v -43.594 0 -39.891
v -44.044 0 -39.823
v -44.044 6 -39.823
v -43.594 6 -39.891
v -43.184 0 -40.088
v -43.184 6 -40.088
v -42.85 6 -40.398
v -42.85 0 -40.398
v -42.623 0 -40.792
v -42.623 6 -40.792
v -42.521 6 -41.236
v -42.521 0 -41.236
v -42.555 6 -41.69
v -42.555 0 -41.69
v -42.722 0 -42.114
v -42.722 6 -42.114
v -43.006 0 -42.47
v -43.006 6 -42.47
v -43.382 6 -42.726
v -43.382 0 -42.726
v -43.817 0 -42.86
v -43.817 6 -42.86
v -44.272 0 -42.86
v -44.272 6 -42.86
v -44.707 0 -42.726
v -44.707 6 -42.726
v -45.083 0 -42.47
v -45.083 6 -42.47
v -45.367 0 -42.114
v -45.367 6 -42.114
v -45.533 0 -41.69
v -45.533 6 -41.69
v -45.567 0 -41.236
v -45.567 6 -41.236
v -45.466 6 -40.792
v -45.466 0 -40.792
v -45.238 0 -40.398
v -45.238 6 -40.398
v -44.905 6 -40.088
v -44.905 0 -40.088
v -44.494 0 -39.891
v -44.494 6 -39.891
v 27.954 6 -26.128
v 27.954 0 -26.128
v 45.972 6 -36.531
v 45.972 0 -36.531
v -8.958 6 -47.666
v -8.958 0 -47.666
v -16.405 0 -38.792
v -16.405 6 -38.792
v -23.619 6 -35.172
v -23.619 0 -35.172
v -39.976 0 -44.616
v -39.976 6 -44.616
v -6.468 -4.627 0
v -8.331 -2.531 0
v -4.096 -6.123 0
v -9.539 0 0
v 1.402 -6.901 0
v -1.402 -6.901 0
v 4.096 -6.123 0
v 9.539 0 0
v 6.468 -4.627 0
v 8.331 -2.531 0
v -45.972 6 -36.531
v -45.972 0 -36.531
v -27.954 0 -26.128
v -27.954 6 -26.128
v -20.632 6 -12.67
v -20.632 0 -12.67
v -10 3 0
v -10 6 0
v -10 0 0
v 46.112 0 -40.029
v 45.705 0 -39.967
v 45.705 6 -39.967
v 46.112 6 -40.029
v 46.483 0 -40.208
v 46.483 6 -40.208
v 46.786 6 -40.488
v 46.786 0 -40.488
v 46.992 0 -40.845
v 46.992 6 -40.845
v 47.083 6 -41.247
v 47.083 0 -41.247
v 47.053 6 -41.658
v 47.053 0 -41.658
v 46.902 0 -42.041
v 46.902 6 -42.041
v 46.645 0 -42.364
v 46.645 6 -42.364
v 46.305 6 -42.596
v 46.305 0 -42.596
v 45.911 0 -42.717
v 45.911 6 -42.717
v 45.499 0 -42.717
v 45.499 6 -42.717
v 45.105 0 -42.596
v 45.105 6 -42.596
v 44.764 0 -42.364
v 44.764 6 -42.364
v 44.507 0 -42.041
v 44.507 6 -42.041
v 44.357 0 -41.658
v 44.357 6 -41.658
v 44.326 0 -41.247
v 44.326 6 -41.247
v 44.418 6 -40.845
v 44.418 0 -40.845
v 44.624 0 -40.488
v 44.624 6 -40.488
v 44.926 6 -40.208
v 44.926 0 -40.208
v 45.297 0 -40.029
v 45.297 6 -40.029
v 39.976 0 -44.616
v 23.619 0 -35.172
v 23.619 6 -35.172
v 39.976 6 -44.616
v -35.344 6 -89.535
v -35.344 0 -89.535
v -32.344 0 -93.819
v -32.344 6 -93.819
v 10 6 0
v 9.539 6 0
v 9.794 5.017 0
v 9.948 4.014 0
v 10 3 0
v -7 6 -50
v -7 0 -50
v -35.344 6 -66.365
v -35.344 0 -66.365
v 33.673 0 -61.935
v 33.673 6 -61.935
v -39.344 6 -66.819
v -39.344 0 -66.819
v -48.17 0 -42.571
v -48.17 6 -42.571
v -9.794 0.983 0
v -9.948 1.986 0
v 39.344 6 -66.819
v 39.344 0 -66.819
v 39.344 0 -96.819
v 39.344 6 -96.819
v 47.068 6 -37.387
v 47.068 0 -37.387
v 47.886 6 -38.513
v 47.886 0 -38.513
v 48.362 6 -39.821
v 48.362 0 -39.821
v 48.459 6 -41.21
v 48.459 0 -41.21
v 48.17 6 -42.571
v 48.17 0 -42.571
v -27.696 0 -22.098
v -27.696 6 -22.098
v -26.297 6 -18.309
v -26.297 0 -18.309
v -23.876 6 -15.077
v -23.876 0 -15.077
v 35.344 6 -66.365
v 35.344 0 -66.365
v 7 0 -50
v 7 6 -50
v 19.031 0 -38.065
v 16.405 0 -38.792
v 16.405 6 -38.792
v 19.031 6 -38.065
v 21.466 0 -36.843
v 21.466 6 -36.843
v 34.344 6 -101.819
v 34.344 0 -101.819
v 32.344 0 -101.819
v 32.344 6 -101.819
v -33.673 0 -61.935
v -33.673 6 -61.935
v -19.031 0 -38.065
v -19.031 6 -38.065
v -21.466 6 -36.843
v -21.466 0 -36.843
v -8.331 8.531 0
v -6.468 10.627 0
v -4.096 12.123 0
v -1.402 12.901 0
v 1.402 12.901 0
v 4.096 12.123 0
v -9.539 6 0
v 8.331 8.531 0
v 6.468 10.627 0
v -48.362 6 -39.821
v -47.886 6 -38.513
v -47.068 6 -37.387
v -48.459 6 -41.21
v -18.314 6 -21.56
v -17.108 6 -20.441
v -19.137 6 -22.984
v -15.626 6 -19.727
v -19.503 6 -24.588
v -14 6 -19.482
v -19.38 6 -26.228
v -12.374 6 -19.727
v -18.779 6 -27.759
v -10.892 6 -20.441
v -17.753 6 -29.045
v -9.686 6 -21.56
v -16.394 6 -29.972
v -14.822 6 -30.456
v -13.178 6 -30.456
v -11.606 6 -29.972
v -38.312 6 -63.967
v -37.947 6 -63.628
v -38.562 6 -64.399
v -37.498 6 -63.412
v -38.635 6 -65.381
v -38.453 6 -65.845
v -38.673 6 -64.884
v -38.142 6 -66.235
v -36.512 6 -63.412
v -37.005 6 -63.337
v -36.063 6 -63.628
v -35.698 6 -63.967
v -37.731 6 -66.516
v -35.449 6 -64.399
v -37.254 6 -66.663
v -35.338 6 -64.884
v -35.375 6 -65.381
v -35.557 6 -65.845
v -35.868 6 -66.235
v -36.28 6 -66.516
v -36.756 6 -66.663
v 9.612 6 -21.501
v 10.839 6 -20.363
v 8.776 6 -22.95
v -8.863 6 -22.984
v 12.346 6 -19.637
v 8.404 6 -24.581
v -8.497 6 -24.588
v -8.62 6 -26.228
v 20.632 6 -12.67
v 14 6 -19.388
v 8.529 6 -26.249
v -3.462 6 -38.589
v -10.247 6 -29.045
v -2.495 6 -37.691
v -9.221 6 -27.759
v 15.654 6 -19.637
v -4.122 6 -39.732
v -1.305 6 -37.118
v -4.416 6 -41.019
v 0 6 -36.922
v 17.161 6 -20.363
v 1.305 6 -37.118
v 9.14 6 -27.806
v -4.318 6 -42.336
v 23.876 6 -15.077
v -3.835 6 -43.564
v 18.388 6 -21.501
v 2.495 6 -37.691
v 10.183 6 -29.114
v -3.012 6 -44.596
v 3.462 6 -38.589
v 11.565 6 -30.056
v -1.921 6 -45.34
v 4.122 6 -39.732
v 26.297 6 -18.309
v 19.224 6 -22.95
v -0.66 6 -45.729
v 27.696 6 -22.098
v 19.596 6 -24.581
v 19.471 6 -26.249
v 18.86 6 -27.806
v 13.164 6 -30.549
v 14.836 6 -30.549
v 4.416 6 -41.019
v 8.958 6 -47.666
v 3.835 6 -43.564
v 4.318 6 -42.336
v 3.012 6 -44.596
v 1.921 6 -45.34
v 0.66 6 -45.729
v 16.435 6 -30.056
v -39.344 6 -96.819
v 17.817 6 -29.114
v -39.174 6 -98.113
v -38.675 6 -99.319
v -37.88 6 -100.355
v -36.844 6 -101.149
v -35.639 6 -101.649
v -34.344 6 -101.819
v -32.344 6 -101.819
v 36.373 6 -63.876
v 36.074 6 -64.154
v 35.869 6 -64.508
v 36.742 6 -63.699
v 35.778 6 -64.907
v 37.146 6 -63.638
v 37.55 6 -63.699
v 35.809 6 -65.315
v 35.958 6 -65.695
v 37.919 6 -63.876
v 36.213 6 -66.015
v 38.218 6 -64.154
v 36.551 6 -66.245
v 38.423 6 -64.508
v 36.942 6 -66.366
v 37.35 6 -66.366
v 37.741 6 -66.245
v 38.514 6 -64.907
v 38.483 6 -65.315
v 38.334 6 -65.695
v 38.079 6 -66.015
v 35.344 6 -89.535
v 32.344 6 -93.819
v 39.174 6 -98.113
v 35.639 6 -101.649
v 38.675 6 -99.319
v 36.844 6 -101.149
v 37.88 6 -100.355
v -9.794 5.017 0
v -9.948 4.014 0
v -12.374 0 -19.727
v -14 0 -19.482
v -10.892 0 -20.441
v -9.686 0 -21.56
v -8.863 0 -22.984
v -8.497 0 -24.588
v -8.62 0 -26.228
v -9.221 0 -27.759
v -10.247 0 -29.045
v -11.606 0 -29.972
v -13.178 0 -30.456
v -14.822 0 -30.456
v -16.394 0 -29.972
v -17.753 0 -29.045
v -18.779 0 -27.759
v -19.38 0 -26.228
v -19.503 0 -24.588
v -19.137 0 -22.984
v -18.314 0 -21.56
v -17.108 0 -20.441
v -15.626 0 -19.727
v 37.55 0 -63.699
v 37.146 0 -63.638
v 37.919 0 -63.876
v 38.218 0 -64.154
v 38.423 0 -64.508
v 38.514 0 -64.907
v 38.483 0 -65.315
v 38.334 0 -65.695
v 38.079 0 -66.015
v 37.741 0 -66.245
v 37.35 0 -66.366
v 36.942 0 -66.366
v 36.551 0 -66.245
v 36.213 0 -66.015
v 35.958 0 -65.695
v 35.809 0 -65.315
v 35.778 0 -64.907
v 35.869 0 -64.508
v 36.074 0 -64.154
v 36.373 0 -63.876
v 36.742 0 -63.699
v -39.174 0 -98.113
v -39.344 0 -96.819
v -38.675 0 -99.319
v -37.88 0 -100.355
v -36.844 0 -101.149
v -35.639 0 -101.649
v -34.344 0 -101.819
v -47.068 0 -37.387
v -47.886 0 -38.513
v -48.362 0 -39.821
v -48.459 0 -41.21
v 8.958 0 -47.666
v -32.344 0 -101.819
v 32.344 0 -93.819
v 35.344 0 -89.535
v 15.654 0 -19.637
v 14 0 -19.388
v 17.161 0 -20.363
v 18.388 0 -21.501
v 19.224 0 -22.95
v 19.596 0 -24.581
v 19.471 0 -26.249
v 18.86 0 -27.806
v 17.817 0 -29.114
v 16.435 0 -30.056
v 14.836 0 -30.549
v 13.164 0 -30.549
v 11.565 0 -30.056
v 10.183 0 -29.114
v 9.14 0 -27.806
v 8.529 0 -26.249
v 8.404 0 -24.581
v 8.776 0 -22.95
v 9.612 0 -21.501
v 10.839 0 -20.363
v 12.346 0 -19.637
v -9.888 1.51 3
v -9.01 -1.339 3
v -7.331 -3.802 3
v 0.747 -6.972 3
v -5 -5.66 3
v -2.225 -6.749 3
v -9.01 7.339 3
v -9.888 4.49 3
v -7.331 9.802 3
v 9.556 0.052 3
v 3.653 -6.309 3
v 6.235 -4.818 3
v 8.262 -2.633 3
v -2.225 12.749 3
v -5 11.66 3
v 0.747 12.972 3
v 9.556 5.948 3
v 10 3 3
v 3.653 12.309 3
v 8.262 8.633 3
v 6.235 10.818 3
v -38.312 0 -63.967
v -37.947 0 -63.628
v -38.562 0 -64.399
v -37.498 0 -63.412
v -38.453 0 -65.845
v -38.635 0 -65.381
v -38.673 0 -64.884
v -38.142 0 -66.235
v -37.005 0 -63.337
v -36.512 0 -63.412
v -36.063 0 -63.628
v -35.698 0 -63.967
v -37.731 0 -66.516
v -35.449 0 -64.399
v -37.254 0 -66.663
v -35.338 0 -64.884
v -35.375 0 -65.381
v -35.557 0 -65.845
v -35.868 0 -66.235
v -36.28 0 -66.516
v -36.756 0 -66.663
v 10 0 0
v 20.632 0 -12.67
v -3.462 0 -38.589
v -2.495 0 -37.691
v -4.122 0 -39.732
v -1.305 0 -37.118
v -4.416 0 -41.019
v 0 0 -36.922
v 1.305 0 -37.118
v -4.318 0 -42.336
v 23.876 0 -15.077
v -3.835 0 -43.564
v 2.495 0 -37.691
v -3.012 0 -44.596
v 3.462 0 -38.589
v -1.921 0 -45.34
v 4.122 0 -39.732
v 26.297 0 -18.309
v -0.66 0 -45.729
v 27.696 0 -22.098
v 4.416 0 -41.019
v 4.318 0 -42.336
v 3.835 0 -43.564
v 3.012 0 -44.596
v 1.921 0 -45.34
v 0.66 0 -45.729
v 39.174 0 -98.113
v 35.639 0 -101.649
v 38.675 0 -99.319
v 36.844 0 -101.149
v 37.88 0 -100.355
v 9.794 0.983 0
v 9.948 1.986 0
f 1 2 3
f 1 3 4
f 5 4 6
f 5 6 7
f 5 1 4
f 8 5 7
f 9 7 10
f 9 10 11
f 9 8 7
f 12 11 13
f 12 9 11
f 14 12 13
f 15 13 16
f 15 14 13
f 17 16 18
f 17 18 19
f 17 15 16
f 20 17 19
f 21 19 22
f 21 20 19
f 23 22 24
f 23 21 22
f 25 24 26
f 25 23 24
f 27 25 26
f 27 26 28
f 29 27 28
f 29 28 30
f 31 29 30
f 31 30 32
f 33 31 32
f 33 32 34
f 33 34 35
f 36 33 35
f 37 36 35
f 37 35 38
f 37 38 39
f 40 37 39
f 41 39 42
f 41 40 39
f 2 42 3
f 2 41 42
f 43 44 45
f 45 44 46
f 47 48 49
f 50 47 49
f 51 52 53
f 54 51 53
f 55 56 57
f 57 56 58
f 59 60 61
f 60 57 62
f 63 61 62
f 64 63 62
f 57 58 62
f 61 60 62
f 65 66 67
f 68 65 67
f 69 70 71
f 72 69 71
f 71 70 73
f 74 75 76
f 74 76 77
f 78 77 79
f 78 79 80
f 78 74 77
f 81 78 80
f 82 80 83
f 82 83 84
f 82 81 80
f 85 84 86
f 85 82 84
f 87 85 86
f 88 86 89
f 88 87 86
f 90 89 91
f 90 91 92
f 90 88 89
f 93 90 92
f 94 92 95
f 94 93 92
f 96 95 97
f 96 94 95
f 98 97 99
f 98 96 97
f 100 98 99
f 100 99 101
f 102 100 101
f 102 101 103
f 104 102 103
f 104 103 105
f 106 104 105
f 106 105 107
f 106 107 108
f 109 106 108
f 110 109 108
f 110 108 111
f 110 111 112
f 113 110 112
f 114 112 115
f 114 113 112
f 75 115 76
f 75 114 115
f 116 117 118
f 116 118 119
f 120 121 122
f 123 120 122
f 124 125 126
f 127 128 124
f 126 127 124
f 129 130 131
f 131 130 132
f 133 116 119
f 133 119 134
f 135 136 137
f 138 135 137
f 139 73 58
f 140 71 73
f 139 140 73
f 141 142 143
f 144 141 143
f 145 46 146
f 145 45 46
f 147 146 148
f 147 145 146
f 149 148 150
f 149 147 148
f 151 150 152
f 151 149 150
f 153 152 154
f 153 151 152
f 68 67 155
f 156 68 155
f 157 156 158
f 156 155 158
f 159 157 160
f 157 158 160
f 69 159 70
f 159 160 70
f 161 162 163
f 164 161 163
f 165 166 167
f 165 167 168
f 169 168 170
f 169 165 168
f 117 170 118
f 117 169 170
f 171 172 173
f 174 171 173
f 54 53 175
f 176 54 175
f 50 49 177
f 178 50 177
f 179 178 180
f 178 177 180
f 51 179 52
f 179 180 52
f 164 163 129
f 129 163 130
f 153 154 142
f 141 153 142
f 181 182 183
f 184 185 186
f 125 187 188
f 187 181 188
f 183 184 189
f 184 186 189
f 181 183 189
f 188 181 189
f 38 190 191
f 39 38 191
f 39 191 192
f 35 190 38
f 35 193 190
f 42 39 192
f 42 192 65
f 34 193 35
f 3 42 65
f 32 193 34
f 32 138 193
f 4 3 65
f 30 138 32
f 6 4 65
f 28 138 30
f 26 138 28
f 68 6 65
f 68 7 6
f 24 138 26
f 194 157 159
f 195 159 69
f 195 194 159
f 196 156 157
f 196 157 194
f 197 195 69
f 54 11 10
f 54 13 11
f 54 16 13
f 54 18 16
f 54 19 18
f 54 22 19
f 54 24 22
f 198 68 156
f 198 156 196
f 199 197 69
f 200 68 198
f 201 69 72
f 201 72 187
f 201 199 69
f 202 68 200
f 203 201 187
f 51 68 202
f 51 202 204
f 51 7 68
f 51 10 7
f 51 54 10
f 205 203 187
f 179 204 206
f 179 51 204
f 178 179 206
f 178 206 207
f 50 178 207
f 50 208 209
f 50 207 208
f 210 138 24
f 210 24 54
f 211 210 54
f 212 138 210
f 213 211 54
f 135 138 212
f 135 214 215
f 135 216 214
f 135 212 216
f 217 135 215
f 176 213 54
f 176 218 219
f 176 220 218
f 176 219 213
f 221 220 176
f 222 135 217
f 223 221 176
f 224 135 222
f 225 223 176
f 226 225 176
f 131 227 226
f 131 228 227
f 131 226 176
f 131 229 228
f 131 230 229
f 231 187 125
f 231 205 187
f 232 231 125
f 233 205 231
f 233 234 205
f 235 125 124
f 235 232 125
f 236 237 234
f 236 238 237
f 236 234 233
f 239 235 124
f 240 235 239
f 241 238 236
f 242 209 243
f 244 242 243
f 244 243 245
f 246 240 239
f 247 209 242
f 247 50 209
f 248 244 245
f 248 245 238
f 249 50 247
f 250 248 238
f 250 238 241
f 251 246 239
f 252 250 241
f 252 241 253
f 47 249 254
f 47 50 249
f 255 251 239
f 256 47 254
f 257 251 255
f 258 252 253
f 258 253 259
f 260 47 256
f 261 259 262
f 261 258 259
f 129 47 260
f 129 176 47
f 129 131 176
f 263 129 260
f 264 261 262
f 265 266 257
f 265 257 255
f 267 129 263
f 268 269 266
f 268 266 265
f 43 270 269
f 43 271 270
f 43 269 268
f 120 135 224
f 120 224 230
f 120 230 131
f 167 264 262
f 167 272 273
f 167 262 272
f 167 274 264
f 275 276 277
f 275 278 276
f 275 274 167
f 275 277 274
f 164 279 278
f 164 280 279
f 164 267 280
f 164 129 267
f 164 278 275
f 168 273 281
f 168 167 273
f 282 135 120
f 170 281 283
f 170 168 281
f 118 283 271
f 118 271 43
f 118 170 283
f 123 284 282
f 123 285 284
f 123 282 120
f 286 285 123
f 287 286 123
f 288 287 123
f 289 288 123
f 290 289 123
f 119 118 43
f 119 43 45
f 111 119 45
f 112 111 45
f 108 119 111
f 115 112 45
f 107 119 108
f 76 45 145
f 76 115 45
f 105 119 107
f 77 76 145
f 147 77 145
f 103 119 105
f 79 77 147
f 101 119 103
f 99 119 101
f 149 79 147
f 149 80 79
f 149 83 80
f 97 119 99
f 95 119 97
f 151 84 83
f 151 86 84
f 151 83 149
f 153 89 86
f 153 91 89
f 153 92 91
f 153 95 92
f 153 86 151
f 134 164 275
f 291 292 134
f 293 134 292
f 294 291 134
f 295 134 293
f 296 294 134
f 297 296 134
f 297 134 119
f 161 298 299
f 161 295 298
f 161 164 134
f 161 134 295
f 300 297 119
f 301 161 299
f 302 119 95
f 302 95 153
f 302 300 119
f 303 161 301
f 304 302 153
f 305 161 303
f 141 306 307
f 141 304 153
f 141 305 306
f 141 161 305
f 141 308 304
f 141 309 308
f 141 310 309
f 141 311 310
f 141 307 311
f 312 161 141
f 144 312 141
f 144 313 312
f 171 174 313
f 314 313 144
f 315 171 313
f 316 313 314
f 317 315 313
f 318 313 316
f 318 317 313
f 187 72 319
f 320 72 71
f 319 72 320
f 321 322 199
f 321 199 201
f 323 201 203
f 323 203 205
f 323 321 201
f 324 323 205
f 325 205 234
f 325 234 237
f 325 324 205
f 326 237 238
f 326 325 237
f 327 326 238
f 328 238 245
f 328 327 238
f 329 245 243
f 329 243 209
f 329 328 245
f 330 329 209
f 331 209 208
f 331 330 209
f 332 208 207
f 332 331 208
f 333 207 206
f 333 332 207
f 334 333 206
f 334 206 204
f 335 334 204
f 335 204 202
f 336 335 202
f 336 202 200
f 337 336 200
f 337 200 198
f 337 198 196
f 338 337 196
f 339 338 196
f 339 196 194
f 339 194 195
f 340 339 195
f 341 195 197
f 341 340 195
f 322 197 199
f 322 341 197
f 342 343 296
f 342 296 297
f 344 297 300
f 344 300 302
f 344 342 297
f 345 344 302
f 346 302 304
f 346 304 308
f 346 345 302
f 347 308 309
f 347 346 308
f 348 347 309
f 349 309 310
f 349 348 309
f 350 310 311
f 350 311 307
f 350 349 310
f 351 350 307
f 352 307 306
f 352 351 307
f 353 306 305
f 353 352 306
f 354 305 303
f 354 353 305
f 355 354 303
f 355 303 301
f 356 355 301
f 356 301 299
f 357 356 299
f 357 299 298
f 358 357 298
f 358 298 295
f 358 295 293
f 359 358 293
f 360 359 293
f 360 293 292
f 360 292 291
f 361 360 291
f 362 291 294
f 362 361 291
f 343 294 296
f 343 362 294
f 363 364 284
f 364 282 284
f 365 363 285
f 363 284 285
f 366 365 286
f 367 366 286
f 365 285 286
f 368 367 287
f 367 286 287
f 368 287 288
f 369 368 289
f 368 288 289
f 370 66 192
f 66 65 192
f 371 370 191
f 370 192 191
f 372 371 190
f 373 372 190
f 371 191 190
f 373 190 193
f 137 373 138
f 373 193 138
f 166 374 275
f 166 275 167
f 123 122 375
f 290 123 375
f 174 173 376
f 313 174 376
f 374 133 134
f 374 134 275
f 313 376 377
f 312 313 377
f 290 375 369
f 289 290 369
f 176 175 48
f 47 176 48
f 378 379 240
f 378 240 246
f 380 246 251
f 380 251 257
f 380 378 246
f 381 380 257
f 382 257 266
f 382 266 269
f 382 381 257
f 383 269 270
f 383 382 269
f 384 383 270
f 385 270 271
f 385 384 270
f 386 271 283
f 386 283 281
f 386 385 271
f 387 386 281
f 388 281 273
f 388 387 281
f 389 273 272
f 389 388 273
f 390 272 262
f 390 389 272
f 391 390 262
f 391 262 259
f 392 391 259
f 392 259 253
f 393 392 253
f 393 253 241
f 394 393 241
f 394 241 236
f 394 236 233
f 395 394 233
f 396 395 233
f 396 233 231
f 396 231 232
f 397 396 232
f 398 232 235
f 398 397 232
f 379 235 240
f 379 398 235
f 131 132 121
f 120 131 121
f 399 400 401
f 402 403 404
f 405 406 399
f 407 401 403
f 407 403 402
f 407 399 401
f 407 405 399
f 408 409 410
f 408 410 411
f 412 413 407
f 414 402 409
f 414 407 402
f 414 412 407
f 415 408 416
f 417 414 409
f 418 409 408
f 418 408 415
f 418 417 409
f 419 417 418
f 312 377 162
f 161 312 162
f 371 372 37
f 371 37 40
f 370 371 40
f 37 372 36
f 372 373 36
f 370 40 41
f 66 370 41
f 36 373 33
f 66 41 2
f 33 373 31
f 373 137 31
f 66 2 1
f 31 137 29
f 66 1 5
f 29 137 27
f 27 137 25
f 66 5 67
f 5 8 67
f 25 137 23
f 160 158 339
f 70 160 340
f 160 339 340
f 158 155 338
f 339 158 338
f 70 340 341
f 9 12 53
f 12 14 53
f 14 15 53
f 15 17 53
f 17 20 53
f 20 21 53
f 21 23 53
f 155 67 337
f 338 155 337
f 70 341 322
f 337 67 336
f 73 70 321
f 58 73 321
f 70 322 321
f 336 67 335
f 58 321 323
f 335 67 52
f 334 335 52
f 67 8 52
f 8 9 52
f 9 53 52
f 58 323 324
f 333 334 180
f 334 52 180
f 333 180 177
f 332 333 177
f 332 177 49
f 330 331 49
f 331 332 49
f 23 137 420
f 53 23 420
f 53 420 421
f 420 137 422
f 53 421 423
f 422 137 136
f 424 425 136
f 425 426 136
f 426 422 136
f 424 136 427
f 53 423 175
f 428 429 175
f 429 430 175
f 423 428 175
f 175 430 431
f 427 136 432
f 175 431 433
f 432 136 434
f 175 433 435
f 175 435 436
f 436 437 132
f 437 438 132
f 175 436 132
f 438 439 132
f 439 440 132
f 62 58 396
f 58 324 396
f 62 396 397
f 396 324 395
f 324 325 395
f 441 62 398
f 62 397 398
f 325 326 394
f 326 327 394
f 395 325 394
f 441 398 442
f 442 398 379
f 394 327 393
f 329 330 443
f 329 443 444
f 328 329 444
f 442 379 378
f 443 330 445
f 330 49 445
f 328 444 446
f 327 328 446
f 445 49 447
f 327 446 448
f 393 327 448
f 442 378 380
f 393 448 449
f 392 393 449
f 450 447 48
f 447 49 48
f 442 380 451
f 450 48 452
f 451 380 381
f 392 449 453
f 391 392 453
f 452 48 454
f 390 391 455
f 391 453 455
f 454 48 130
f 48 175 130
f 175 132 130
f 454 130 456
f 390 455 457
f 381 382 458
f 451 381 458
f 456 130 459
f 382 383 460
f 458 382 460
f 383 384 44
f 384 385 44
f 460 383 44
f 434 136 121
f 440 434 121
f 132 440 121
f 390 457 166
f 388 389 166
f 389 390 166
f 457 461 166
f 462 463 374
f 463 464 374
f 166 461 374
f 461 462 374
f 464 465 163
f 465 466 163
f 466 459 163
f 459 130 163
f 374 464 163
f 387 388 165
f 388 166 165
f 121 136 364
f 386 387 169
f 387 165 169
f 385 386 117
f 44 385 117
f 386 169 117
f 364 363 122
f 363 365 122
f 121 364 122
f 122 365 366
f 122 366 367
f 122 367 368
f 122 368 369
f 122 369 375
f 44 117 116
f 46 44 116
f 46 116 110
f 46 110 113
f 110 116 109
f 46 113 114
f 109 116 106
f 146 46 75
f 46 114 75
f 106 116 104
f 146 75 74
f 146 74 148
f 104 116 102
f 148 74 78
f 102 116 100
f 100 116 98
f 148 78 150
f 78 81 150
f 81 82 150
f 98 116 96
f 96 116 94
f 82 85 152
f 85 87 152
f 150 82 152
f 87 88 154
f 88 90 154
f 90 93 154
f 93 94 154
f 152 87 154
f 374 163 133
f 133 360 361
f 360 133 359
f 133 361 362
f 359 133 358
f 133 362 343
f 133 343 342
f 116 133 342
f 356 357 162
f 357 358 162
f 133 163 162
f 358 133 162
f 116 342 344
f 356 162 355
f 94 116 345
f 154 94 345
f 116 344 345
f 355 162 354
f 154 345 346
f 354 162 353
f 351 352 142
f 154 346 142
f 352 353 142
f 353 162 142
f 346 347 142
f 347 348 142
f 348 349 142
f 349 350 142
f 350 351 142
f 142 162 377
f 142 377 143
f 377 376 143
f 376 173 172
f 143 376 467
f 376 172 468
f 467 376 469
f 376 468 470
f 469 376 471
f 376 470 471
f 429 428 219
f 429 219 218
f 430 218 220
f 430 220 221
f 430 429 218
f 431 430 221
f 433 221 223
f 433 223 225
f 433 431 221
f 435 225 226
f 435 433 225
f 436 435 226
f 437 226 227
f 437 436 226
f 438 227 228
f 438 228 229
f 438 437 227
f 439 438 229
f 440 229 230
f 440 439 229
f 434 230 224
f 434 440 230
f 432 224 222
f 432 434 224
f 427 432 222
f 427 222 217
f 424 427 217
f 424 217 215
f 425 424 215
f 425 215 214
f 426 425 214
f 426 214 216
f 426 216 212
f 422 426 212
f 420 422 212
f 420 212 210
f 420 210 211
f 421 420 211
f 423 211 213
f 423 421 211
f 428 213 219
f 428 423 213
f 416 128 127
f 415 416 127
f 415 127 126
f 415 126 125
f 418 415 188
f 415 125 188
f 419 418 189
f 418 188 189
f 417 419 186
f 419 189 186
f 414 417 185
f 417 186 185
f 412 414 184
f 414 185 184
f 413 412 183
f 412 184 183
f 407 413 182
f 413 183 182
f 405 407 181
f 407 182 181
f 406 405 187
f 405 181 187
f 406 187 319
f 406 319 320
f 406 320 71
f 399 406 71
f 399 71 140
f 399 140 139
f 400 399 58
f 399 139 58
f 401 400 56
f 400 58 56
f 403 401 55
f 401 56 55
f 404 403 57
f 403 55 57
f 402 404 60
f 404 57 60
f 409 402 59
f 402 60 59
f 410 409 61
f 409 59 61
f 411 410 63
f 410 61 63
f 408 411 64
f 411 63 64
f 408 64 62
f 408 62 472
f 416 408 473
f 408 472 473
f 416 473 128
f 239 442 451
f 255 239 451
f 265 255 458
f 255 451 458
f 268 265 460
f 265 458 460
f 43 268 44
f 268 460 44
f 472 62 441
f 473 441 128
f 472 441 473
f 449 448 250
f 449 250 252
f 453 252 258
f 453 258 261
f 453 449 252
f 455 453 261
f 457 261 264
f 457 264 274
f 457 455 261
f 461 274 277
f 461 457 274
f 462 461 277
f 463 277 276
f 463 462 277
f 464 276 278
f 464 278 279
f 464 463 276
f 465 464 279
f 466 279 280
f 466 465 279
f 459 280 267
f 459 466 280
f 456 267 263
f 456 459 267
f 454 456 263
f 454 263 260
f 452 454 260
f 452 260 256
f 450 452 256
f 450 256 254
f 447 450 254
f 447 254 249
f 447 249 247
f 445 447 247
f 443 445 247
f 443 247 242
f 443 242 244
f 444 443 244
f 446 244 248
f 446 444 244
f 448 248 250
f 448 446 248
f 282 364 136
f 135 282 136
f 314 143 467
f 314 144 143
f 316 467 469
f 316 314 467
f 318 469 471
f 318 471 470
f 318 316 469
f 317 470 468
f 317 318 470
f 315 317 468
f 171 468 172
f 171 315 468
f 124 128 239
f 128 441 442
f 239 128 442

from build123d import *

# Parameters (mm, degrees)
SKETCH_1_R      = 5.517972707
SKETCH_1_R_2    = 5.611863705
SKETCH_1_R_3    = 1.527148593
SKETCH_1_R_4    = 1.382615372
SKETCH_1_R_5    = 1.672120879
SKETCH_1_R_6    = 1.371563178
SKETCH_1_R_7    = 4.42854447
EXTRUDE_1_DEPTH = 6
SKETCH_2_R      = 10
EXTRUDE_2_DEPTH = 3
FILLET_1_R      = 5


with BuildPart() as part:
    # 草图1 → 凸台-拉伸1 (new body)
    with BuildSketch(Plane(origin=(0, 0, 0), x_dir=(1, 0, 0), z_dir=(0, 1, 0))):
        with BuildLine():
            Line((-10, 0), (10, 0))
            Line((10, 0), (20.63165677, 12.67031515))
            ThreePointArc((20.63165677, 12.67031515), (26.297438403, 18.308736388), (27.95445115, 26.128402898))
            Line((27.95445115, 26.128402898), (49.605086245, 38.628402898))
            Line((49.605086245, 38.628402898), (39.344481945, 66.819181521))
            Line((39.344481945, 66.819181521), (39.344481945, 101.819181521))
            Line((39.344481945, 101.819181521), (32.344481945, 101.819181521))
            Line((32.344481945, 101.819181521), (32.344481945, 93.819181521))
            Line((32.344481945, 93.819181521), (35.344481945, 89.534737501))
            Line((35.344481945, 89.534737501), (35.344481945, 66.364694281))
            Line((35.344481945, 66.364694281), (7, 50))
            Line((7, 50), (-7, 50))
            Line((-7, 50), (-35.344481945, 66.364694281))
            Line((-35.344481945, 66.364694281), (-35.344481945, 89.534737501))
            Line((-35.344481945, 89.534737501), (-32.344481945, 93.819181521))
            Line((-32.344481945, 93.819181521), (-32.344481945, 101.819181521))
            Line((-32.344481945, 101.819181521), (-39.344481945, 101.819181521))
            Line((-39.344481945, 101.819181521), (-39.344481945, 66.819181521))
            Line((-39.344481945, 66.819181521), (-49.605086245, 38.628402898))
            Line((-49.605086245, 38.628402898), (-27.95445115, 26.128402898))
            ThreePointArc((-27.95445115, 26.128402898), (-26.297438403, 18.308736388), (-20.63165677, 12.67031515))
            Line((-20.63165677, 12.67031515), (-10, 0))
        make_face()
        with Locations(Location((-14, 25, 0), (0, 0, 270))):
            Circle(SKETCH_1_R, mode=Mode.SUBTRACT)
        with Locations(Location((14, 25, 0), (0, 0, 270))):
            Circle(SKETCH_1_R_2, mode=Mode.SUBTRACT)
        with Locations(Location((-44.044259413, 41.350104136, 0), (0, 0, 270))):
            Circle(SKETCH_1_R_3, mode=Mode.SUBTRACT)
        with Locations(Location((45.704626141, 41.350104136, 0), (0, 0, 270))):
            Circle(SKETCH_1_R_4, mode=Mode.SUBTRACT)
        with Locations(Location((-37.005131134, 65.009396406, 0), (0, 0, 270))):
            Circle(SKETCH_1_R_5, mode=Mode.SUBTRACT)
        with Locations(Location((37.145951464, 65.009396406, 0), (0, 0, 270))):
            Circle(SKETCH_1_R_6, mode=Mode.SUBTRACT)
        with Locations(Location((0, 41.350104136, 0), (0, 0, 270))):
            Circle(SKETCH_1_R_7, mode=Mode.SUBTRACT)
        with BuildLine():
            Line((8.958110934, 47.66641426), (16.404682223, 38.791936173))
            ThreePointArc((16.404682223, 38.791936173), (20.278324988, 37.51329834), (23.618950039, 35.172305548))
            Line((23.618950039, 35.172305548), (39.976426, 44.616298697))
            Line((39.976426, 44.616298697), (33.672776585, 61.935433126))
            Line((33.672776585, 61.935433126), (8.958110934, 47.66641426))
        make_face(mode=Mode.SUBTRACT)
        with BuildLine():
            Line((-8.958110934, 47.66641426), (-16.404682223, 38.791936173))
            ThreePointArc((-16.404682223, 38.791936173), (-20.278324988, 37.51329834), (-23.618950039, 35.172305548))
            Line((-23.618950039, 35.172305548), (-39.976426, 44.616298697))
            Line((-39.976426, 44.616298697), (-33.672776585, 61.935433126))
            Line((-33.672776585, 61.935433126), (-8.958110934, 47.66641426))
        make_face(mode=Mode.SUBTRACT)
    extrude(amount=EXTRUDE_1_DEPTH)

    # 草图2 → 凸台-拉伸2 (add)
    with BuildSketch(Plane.XY):
        with Locations((0, 3)):
            Circle(SKETCH_2_R)
    extrude(amount=EXTRUDE_2_DEPTH)

    # 圆角1
    fillet_1_edges = [part.edges().sort_by_distance(p)[0] for p in [
        (-49.605086245, 3, -38.628402898),
        (-39.344481945, 3, -101.819181521),
        (39.344481945, 3, -101.819181521),
        (49.605086245, 3, -38.628402898),
    ]]
    fillet(fillet_1_edges, radius=FILLET_1_R)


solid = part.part
